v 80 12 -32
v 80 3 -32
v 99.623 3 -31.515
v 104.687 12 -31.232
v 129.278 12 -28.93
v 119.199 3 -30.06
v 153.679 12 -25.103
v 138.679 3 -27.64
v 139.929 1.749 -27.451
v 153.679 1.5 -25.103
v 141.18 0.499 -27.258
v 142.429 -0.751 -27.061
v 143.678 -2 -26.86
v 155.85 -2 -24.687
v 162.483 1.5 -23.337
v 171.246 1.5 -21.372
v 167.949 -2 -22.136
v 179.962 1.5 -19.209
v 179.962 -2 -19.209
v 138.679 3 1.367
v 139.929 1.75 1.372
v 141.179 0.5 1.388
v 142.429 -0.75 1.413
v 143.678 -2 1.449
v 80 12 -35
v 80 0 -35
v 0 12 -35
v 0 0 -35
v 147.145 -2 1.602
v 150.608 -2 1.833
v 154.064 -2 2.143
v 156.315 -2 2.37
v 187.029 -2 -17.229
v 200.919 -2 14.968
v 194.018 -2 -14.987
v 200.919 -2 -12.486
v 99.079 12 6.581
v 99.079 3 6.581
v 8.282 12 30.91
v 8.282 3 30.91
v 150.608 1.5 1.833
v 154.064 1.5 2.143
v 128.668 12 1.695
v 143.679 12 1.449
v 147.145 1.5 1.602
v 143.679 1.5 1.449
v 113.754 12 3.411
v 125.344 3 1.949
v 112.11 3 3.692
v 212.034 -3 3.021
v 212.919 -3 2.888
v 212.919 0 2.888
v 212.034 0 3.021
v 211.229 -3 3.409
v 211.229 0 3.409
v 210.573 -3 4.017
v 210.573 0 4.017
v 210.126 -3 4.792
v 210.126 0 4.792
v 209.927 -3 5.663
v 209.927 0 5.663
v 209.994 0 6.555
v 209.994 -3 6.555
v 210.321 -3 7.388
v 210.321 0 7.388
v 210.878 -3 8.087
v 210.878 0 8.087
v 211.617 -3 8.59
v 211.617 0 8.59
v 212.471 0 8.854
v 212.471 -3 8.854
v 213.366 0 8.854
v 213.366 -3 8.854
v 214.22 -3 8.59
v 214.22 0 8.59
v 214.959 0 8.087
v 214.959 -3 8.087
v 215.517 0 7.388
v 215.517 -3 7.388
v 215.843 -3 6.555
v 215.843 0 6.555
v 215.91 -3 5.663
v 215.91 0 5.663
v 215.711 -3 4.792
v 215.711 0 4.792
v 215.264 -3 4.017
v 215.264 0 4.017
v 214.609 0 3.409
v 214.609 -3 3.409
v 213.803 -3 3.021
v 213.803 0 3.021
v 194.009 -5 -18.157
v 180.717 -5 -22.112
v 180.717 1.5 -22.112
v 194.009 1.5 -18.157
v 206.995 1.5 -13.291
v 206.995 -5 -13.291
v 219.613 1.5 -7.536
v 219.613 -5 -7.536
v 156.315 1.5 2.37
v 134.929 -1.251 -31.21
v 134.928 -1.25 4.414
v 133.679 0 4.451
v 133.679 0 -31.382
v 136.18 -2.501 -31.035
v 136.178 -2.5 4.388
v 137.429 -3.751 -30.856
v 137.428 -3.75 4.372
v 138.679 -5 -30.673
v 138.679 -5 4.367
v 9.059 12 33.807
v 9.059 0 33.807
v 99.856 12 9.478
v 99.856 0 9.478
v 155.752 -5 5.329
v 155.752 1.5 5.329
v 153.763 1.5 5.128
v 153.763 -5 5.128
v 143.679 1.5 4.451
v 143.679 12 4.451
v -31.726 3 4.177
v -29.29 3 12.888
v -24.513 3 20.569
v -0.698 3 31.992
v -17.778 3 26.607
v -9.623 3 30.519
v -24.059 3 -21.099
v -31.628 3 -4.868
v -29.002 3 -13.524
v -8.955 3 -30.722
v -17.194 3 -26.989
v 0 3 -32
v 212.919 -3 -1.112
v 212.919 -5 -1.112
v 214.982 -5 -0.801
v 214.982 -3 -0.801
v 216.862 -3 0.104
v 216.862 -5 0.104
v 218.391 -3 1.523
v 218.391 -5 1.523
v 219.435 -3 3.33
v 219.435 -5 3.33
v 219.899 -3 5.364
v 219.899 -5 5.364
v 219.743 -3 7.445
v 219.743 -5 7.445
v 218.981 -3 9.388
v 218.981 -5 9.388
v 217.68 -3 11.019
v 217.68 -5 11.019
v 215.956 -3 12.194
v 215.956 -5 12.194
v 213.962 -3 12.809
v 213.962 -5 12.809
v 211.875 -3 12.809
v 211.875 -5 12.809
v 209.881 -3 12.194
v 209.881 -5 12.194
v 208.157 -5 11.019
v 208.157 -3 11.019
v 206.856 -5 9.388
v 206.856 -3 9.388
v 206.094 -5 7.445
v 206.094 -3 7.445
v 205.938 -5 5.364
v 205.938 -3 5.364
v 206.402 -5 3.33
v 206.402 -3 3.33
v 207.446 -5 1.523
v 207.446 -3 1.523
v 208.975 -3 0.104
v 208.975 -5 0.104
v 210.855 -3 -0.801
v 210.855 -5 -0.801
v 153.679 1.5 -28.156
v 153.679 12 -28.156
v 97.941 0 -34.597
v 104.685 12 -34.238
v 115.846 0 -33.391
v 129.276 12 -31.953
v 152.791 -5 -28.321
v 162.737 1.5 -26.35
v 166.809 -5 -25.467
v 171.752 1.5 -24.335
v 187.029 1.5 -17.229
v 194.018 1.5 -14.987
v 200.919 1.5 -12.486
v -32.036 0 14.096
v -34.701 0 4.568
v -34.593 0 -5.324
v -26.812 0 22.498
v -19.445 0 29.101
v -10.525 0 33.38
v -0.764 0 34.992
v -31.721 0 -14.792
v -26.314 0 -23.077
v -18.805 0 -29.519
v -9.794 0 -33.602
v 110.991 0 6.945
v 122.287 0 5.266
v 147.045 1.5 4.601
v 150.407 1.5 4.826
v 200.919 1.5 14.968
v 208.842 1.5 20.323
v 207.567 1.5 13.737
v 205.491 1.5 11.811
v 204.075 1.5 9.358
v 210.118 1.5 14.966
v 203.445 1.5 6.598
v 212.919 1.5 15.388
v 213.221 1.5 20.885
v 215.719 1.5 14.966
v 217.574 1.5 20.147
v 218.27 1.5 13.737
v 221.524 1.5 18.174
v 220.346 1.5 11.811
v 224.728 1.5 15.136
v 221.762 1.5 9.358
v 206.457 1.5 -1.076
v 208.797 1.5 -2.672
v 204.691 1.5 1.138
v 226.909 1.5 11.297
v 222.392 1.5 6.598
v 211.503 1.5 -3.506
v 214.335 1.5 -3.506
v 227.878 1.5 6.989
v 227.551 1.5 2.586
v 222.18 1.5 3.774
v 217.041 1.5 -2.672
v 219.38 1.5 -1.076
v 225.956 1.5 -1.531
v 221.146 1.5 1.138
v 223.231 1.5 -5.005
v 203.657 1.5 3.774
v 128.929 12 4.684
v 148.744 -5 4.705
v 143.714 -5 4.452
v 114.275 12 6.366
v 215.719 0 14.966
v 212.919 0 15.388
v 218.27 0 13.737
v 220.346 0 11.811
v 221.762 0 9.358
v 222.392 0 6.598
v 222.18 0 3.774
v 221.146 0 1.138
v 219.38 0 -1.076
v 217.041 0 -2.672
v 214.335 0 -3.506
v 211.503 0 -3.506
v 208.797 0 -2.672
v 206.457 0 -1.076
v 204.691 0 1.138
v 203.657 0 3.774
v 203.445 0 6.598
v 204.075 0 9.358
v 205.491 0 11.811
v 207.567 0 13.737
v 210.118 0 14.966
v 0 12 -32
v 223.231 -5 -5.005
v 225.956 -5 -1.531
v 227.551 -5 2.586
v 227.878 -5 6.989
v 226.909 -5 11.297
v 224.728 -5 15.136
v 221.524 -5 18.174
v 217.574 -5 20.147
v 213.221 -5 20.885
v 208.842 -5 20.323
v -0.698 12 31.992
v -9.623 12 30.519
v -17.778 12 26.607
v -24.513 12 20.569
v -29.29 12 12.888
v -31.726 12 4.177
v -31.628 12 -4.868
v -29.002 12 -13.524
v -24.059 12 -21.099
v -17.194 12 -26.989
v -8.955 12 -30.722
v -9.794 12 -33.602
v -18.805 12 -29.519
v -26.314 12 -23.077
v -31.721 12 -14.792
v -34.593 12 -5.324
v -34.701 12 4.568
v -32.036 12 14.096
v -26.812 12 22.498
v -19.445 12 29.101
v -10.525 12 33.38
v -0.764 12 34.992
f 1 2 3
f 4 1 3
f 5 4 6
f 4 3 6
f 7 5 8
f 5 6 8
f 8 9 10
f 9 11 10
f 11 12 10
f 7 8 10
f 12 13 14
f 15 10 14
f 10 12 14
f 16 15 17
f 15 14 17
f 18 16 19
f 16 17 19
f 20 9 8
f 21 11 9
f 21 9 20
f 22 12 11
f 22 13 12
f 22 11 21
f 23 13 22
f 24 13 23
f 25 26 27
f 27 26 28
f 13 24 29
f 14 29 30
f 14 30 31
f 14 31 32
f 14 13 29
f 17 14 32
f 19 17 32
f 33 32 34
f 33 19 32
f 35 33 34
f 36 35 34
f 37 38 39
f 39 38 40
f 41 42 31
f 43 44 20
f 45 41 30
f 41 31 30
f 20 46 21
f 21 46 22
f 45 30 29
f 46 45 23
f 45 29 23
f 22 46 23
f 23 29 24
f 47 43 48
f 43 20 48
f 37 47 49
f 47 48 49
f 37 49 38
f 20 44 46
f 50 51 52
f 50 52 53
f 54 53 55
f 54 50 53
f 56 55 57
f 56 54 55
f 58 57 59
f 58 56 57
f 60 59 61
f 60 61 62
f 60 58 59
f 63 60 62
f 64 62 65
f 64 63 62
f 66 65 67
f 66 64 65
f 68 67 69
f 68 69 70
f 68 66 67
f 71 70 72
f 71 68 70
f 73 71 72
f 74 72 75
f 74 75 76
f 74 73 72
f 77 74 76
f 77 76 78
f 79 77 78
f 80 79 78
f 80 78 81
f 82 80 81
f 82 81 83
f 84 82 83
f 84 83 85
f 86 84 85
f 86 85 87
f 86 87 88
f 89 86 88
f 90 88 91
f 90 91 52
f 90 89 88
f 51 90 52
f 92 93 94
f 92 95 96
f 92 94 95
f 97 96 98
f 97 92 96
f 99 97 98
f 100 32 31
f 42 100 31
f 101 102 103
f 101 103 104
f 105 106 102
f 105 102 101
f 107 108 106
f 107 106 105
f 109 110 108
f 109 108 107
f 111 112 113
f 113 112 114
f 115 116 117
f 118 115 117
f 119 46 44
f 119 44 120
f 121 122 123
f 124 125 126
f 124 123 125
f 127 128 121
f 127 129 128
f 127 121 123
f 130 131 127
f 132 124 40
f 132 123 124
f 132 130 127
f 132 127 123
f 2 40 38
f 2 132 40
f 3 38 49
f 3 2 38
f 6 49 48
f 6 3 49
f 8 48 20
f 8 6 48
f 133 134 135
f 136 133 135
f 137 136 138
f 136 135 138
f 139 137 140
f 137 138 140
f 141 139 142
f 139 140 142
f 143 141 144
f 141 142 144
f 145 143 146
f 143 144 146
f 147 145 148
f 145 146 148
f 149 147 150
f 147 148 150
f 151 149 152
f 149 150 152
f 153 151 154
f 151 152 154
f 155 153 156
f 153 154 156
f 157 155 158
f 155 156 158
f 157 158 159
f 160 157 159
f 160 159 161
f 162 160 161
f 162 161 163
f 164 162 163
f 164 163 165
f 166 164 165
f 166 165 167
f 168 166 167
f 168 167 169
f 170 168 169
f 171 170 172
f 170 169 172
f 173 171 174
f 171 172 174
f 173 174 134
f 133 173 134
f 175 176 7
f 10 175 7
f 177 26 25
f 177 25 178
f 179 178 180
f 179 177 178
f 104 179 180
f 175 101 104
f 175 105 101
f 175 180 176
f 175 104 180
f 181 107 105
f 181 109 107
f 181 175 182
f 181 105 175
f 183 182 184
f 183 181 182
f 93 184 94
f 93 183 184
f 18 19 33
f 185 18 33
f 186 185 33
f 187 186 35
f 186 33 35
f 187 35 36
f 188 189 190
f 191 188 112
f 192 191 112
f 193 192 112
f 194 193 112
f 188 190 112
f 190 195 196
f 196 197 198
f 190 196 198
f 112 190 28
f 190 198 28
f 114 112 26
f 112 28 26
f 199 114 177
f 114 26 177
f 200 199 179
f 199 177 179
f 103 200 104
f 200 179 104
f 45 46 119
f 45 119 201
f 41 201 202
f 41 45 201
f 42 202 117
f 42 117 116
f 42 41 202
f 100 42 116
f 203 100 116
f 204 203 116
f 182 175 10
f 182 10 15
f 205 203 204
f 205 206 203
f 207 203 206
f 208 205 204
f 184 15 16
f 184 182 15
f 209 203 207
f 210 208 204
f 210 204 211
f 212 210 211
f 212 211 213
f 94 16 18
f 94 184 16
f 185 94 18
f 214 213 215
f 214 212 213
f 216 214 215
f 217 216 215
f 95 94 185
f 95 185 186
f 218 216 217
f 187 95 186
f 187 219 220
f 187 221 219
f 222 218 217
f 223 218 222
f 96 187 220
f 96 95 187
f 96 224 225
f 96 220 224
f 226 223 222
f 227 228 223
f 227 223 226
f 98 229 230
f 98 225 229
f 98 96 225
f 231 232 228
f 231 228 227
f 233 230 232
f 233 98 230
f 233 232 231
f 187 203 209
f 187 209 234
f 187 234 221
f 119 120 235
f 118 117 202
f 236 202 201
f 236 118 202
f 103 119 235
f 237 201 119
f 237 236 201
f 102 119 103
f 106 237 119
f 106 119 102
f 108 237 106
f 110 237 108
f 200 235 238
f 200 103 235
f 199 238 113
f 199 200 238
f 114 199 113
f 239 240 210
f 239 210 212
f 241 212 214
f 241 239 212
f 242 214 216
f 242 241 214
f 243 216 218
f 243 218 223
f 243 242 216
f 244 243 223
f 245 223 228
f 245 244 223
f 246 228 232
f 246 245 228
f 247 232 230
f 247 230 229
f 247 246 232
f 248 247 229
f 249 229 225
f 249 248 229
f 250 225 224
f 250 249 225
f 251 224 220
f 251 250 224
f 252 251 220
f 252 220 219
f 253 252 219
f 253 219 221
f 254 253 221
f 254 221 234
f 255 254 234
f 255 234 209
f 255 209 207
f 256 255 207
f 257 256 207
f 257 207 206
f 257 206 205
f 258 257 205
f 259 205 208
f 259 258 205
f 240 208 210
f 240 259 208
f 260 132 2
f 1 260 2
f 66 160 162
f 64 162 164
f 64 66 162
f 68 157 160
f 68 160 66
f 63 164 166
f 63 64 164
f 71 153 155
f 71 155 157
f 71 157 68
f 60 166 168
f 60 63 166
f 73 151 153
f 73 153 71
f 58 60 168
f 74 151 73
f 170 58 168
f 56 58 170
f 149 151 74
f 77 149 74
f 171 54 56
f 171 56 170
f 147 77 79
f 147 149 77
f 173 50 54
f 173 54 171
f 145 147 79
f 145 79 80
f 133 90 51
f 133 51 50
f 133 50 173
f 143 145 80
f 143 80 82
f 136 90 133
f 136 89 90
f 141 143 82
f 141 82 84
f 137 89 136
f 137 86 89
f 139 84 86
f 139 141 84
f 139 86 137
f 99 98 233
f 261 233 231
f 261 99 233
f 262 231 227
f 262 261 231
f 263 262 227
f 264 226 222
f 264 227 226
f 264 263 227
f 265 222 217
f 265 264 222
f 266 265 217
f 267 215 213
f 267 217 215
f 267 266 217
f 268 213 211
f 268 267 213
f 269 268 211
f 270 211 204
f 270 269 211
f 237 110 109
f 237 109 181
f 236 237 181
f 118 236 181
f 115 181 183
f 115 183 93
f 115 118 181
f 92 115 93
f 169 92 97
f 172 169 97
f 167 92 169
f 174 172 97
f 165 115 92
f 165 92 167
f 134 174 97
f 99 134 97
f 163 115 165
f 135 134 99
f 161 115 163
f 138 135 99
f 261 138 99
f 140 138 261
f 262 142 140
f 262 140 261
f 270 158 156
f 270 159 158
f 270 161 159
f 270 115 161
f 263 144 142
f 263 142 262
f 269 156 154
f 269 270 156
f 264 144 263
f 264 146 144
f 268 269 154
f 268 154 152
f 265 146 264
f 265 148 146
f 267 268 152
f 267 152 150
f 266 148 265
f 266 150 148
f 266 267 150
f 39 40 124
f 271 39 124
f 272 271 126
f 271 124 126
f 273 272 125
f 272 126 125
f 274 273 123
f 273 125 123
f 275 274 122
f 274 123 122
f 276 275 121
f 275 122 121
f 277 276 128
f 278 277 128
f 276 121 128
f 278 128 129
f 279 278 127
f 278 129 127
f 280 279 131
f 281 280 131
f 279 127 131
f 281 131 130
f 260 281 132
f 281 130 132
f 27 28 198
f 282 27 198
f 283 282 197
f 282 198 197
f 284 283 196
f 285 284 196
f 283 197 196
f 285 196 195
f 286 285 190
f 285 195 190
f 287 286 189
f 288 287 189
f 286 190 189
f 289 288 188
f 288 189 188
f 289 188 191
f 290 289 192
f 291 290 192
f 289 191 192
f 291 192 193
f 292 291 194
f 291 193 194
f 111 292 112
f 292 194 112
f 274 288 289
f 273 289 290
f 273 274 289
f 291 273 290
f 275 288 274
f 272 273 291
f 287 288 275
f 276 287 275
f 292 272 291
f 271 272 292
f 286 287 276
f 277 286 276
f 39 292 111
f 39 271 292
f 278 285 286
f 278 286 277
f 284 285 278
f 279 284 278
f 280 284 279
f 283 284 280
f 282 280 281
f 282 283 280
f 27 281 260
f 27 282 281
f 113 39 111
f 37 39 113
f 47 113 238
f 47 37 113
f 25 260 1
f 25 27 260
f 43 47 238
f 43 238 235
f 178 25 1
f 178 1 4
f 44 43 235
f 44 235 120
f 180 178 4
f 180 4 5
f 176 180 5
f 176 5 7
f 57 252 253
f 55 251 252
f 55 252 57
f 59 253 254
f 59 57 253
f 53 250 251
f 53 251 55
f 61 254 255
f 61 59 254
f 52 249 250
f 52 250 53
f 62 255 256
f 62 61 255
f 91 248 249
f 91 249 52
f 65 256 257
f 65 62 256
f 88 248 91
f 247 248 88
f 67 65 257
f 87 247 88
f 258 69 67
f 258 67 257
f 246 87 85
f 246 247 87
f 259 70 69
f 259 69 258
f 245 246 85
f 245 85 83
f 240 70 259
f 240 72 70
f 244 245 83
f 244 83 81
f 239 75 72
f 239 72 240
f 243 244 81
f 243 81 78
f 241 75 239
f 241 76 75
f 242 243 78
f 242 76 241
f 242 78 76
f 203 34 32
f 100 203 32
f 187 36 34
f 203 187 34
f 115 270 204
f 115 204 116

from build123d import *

# Parameters (mm, degrees)
SKETCH_1_R          = 35.00000000000001
SKETCH_1_R_2        = 14.999999999998519
SKETCH_1_R_3        = 2.999999999998513
EXTRUDE_1_DEPTH     = 3
EXTRUDE_2_DEPTH     = 9
EXTRUDE_START       = 5
SKETCH_3_R          = 2.999999999998504
EXTRUDE_3_DEPTH     = 5
CHAMFER_2_SIZE      = 5
CUT_EXTRUDE_START   = -5
SKETCH_5_R          = 2.9999999999987814
CUT_EXTRUDE_1_DEPTH = 5
CHAMFER_3_SIZE      = 5
CUT_EXTRUDE_START_2 = -10.5
CUT_EXTRUDE_2_DEPTH = 10.5
SKETCH_7_R          = 2.9999999999981983
EXTRUDE_5_DEPTH     = 3.5
CUT_EXTRUDE_START_3 = -1.5
SKETCH_8_R          = 9.499999999999694
SKETCH_8_R_2        = 2.9999999999981988
CUT_EXTRUDE_3_DEPTH = 1.5
SKETCH_9_R          = 7.000000000000014
CUT_EXTRUDE_4_DEPTH = 2


with BuildPart() as part:
    # 草图1 → 凸台-拉伸1 (new body)
    # profile 1 of 3: a face of its own
    with BuildSketch(Plane(origin=(0, 0, 0), x_dir=(1, 0, 0), z_dir=(0, 1, 0))):
        Circle(SKETCH_1_R)
    # profile 2 of 3: a face of its own
    with BuildSketch(Plane(origin=(0, 0, 0), x_dir=(1, 0, 0), z_dir=(0, 1, 0))):
        with BuildLine():
            Line((80, 35.00000000000001), (0, 35.00000000000001))
            ThreePointArc((2.14e-15, 35.00000000000001), (24.74873734152917, 24.748737341529168), (35.00000000000001, 0))
            ThreePointArc((35.00000000000001, -8.57e-15), (27.76736691019325, -21.306650015305213), (9.058666578588273, -33.80740392011739))
            Line((9.058666578588266, -33.80740392011739), (99.85569424976063, -9.478413680480333))
            ThreePointArc((99.85569424976065, -9.478413680480344), (126.61144649660456, -4.8534588703142845), (153.76260315826568, -5.127643524347377))
            Line((153.76260315826565, -5.127643524347345), (155.75246507959224, -5.328764219589036))
            Line((155.75246507959224, -5.328764219589036), (208.84160576054387, -20.322897386273407))
            ThreePointArc((208.84160576054387, -20.322897386273397), (198.92789824314943, -0.47835413257180903), (219.61266324779353, 7.5358825990905824))
            ThreePointArc((219.61266324779353, 7.53588259909057), (200.54444782077312, 15.836627562355744), (180.7173501180477, 22.11240665367282))
            ThreePointArc((180.71735011804773, 22.112406653672906), (130.7692689455484, 31.765020296314162), (80, 35.00000000000006))
        make_face()
    # profile 3 of 3: a face of its own
    with BuildSketch(Plane(origin=(0, 0, 0), x_dir=(1, 0, 0), z_dir=(0, 1, 0))):
        with Locations((212.91861413363648, -5.887593346327154)):
            Circle(SKETCH_1_R_2)
        with Locations(Location((212.91861413363648, -5.887593346327154, 0), (0, 0, 270))):
            Circle(SKETCH_1_R_3, mode=Mode.SUBTRACT)
    extrude(amount=EXTRUDE_1_DEPTH)

    # 草图2 → 凸台-拉伸2 (add)
    with BuildSketch(Plane(origin=(0, 3, 0), x_dir=(1, 0, 0), z_dir=(0, 1, 0))):
        with BuildLine():
            ThreePointArc((2.14e-15, 35), (-34.70057014808337, -4.5684167277018295), (9.058666578588264, -33.807403920117395))
            Line((9.058666578588271, -33.80740392011739), (99.85569424976065, -9.478413680480333))
            ThreePointArc((99.85569424976063, -9.478413680480287), (126.61144649660456, -4.853458870314313), (153.76260315826565, -5.127643524347235))
            Line((153.76260315826565, -5.127643524347247), (155.75246507959224, -5.328764219589035))
            Line((155.75246507959224, -5.328764219589035), (208.84160576054387, -20.3228973862734))
            ThreePointArc((208.84160576054387, -20.322897386273414), (226.9093300241235, -11.296832560082503), (219.61266324779353, 7.535882599090587))
            ThreePointArc((219.61266324779353, 7.535882599090655), (200.54444782077314, 15.83662756235583), (180.71735011804776, 22.112406653672934))
            ThreePointArc((180.71735011804773, 22.112406653672906), (130.76926894554842, 31.765020296314162), (80.00000000000003, 35))
            Line((80.00000000000003, 35.00000000000003), (0, 35))
        make_face()
        with BuildLine():
            Line((99.0792371144531, -6.580636201613121), (8.282209443280715, -30.909626441250172))
            ThreePointArc((8.282209443280705, -30.909626441250175), (-31.726235563961932, -4.176838151041671), (1.96e-15, 32))
            Line((0, 32), (80.00000000000007, 32.00000000000003))
            ThreePointArc((80.00000000000009, 31.999999999999943), (130.3884994284568, 28.789282644091656), (179.96196999216235, 19.20906360377029))
            ThreePointArc((179.96196999216238, 19.209063603770403), (199.49166122934687, 13.027421198822964), (218.273853424962, 4.851187410006787))
            ThreePointArc((218.27385342496197, 4.851187410006782), (224.11118684602587, -10.214984717331333), (209.65700743516246, -17.43583657828386))
            Line((209.65700743516246, -17.435836578283872), (156.31528166260176, -2.370365008850316))
            Line((156.31528166260176, -2.370365008850316), (154.06428420112817, -2.1428506423573914))
            ThreePointArc((154.06428420112817, -2.142850642357388), (126.37010440623386, -1.8631822952438597), (99.0792371144531, -6.5806362016131175))
        make_face(mode=Mode.SUBTRACT)
    extrude(amount=EXTRUDE_2_DEPTH)

    # 草图3 → 凸台-拉伸3 (add)
    # profile 1 of 2: a face of its own
    with BuildSketch(Plane.XZ.offset(EXTRUDE_START)):
        with BuildLine():
            ThreePointArc((219.61266324779353, -7.535882599090586), (198.92789824314943, 0.47835413257181436), (208.84160576054387, 20.322897386273397))
            Line((208.84160576054387, 20.322897386273407), (155.75246507959224, 5.328764219589036))
            Line((155.75246507959224, 5.328764219589036), (153.76260315826562, 5.127643524347275))
            ThreePointArc((153.76260315826562, 5.127643524347263), (146.23015300001683, 4.557497197907537), (138.6785510151405, 4.36728762384061))
            Line((138.6785510151405, 4.36728762384056), (138.67855101513894, -30.67262686564981))
            ThreePointArc((138.6785510151389, -30.672626865649704), (159.81279763944207, -26.9565247995821), (180.71735011804768, -22.112406653672792))
            ThreePointArc((180.7173501180477, -22.112406653672878), (200.54444782077314, -15.836627562355801), (219.6126632477936, -7.535882599090598))
        make_face()
    # profile 2 of 2: a face of its own
    with BuildSketch(Plane.XZ.offset(EXTRUDE_START)):
        with BuildLine():
            ThreePointArc((227.918614133635, 5.887593346327154), (221.96971556947213, 17.84909671330278), (208.84160576054387, 20.322897386273397))
            ThreePointArc((208.84160576054387, 20.322897386273397), (198.92789824314943, 0.47835413257181436), (219.61266324779353, -7.535882599090586))
            ThreePointArc((219.61266324779353, -7.535882599090586), (225.6742155838289, -2.0051014814110157), (227.918614133635, 5.887593346327151))
        make_face()
        with Locations(Location((212.91861413363648, 5.887593346327154, 0), (0, 0, 270))):
            Circle(SKETCH_3_R, mode=Mode.SUBTRACT)
    extrude(amount=-EXTRUDE_3_DEPTH)

    # 倒角2
    chamfer_2_edges = [part.edges().sort_by_distance(p)[0] for p in [
        (138.6785510151397, 0, -13.152669620904625),
    ]]
    chamfer(chamfer_2_edges, length=CHAMFER_2_SIZE - 0.0001)  # a hair under: the kernel refuses the full size

    # 草图5 → 切除-拉伸1 (cut)
    # profile 1 of 2: a face of its own
    with BuildSketch(Plane(origin=(0, 3, 0), x_dir=(1, 0, 0), z_dir=(0, 1, 0)).offset(CUT_EXTRUDE_START)):
        with BuildLine():
            ThreePointArc((179.96196999216247, 19.209063603770403), (159.43218530873725, 23.972399968273407), (138.6785510151319, 27.639564550956322))
            Line((138.67855101513908, 27.639564550957424), (138.67855101514036, -1.3672876238405252))
            ThreePointArc((138.67855101514482, -1.3672876238405536), (146.38118503971654, -1.561301389388916), (154.06428420112817, -2.142850642357331))
            Line((154.06428420112817, -2.1428506423573634), (156.31528166260176, -2.370365008850312))
            Line((156.31528166260176, -2.370365008850312), (200.99582501119374, -14.989631554428025))
            ThreePointArc((200.9958250111938, -14.989631554427945), (198.86414193463486, -0.6462374904961061), (209.86727048552746, 8.798771143944375))
            ThreePointArc((209.8672704855274, 8.798771143943867), (195.1241257664407, 14.605756926583496), (179.96196999216244, 19.209063603770346))
        make_face()
    # profile 2 of 2: a face of its own
    with BuildSketch(Plane(origin=(0, 3, 0), x_dir=(1, 0, 0), z_dir=(0, 1, 0)).offset(CUT_EXTRUDE_START)):
        with BuildLine():
            ThreePointArc((218.273853424962, 4.851187410006787), (214.09382814337536, 6.874525823264776), (209.8672704855274, 8.798771143943867))
            ThreePointArc((209.86727048552746, 8.798771143944375), (198.86414193463486, -0.6462374904961061), (200.9958250111938, -14.989631554427945))
            Line((200.99582501119374, -14.989631554428025), (209.65700743516246, -17.435836578283855))
            ThreePointArc((209.65700743516246, -17.435836578283855), (224.11118684602584, -10.214984717331326), (218.27385342496197, 4.851187410006769))
        make_face()
        with Locations(Location((212.91861413363648, -5.887593346327154, 0), (0, 0, 90))):
            Circle(SKETCH_5_R, mode=Mode.SUBTRACT)
    extrude(amount=CUT_EXTRUDE_1_DEPTH, mode=Mode.SUBTRACT)

    # 倒角3
    chamfer_3_edges = [part.edges().sort_by_distance(p)[0] for p in [
        (138.6785510151397, -2, -13.13613846355845),
    ]]
    chamfer(chamfer_3_edges, length=CHAMFER_3_SIZE - 0.0001)  # a hair under: the kernel refuses the full size

    # 草图6 → 切除-拉伸2 (cut)
    with BuildSketch(Plane(origin=(0, 12, 0), x_dir=(1, 0, 0), z_dir=(0, 1, 0)).offset(CUT_EXTRUDE_START_2)):
        with BuildLine():
            ThreePointArc((180.71735011804762, 22.112406653672963), (167.25029047437937, 25.368270754855814), (153.67855101513908, 28.155784798226705))
            Line((153.67855101513908, 28.155784798226733), (153.67855101513908, 25.103154460854327))
            ThreePointArc((153.6785510151392, 25.103154460854853), (166.8702636733634, 22.37908731541046), (179.96196999216247, 19.209063603770403))
            ThreePointArc((179.96196999216244, 19.209063603770375), (199.4916612293469, 13.027421198822992), (218.273853424962, 4.8511874100068155))
            ThreePointArc((218.27385342496197, 4.851187410006791), (224.11118684602587, -10.214984717331326), (209.65700743516246, -17.435836578283855))
            Line((209.65700743516246, -17.43583657828387), (156.31528166260176, -2.370365008850314))
            Line((156.31528166260176, -2.370365008850314), (154.06428420112817, -2.1428506423573634))
            ThreePointArc((154.06428420112817, -2.1428506423573594), (148.87731974032897, -1.707583980442621), (143.67855101514033, -1.4490087949183987))
            Line((143.67855101514033, -1.4490087949183827), (143.67855101514033, -4.450644118191127))
            ThreePointArc((143.67855101514033, -4.450644118191121), (148.72628059305634, -4.704188864229678), (153.76260315826565, -5.127643524347263))
            Line((153.76260315826565, -5.127643524347275), (155.7524650795923, -5.328764219589041))
            Line((155.7524650795923, -5.328764219589041), (208.84160576054387, -20.322897386273397))
            ThreePointArc((208.84160576054387, -20.32289738627341), (226.90933002412353, -11.296832560082489), (219.6126632477935, 7.535882599090598))
            ThreePointArc((219.61266324779353, 7.535882599090627), (200.54444782077303, 15.836627562355801), (180.7173501180476, 22.112406653672906))
        make_face()
    extrude(amount=CUT_EXTRUDE_2_DEPTH, mode=Mode.SUBTRACT)

    # 草图7 → 凸台-拉伸5 (add)
    # profile 1 of 3: a face of its own
    with BuildSketch(Plane(origin=(0, -2, 0), x_dir=(1, 0, 0), z_dir=(0, 1, 0))):
        with BuildLine():
            ThreePointArc((218.273853424962, 4.8511874100068155), (209.68814372522309, 8.87768125206452), (200.91861413363713, 12.48633951388669))
            Line((200.91861413363716, 12.486339513886715), (200.91861413363796, -5.887593233665726))
            ThreePointArc((200.91861413363787, -5.88759323366572), (206.60445831934817, 4.31688784346667), (218.273853424962, 4.851187410006878))
        make_face()
    # profile 2 of 3: a face of its own
    with BuildSketch(Plane(origin=(0, -2, 0), x_dir=(1, 0, 0), z_dir=(0, 1, 0))):
        with BuildLine():
            ThreePointArc((218.273853424962, 4.851187410006878), (206.60445831934817, 4.31688784346667), (200.91861413363787, -5.88759323366572))
            ThreePointArc((200.91861413363787, -5.887593233665726), (203.3494114060658, -13.128474450075544), (209.65700743516243, -17.43583657828395))
            ThreePointArc((209.65700743516243, -17.43583657828395), (220.15949528230487, -15.456796039907507), (224.9186141336351, -5.887593346327157))
            ThreePointArc((224.9186141336351, -5.887593346327154), (223.12309529379024, 0.4265625158632913), (218.273853424962, 4.851187410006878))
        make_face()
        with Locations(Location((212.91861413363648, -5.887593346327154, 0), (0, 0, 90))):
            Circle(SKETCH_7_R, mode=Mode.SUBTRACT)
    # profile 3 of 3: a face of its own
    with BuildSketch(Plane(origin=(0, -2, 0), x_dir=(1, 0, 0), z_dir=(0, 1, 0))):
        with BuildLine():
            ThreePointArc((209.65700743516243, -17.43583657828395), (203.3494114060658, -13.128474450075544), (200.91861413363787, -5.887593233665726))
            Line((200.91861413363796, -5.887593233665726), (200.91861413363836, -14.9678246431627))
            Line((200.91861413363836, -14.967824643162707), (209.65700743516246, -17.43583657828387))
        make_face()
    extrude(amount=EXTRUDE_5_DEPTH)

    # 草图8 → 切除-拉伸3 (cut)
    with BuildSketch(Plane(origin=(0, 1.4999999999999996, 0), x_dir=(1, 0, 0), z_dir=(0, 1, 0)).offset(CUT_EXTRUDE_START_3)):
        with Locations(Location((212.91861413363648, -5.887593346327154, 0), (0, 0, 270))):
            Circle(SKETCH_8_R)
        with Locations(Location((212.91861413363648, -5.887593346327154, 0), (0, 0, 90))):
            Circle(SKETCH_8_R_2, mode=Mode.SUBTRACT)
    extrude(amount=CUT_EXTRUDE_3_DEPTH, mode=Mode.SUBTRACT)

    # 草图9 → 切除-拉伸4 (cut)
    with BuildSketch(Plane.XZ.offset(5)):
        with Locations(Location((212.91861413363645, 5.887593346328139, 0), (0, 0, 270))):
            Circle(SKETCH_9_R)
    extrude(amount=-CUT_EXTRUDE_4_DEPTH, mode=Mode.SUBTRACT)


solid = part.part
